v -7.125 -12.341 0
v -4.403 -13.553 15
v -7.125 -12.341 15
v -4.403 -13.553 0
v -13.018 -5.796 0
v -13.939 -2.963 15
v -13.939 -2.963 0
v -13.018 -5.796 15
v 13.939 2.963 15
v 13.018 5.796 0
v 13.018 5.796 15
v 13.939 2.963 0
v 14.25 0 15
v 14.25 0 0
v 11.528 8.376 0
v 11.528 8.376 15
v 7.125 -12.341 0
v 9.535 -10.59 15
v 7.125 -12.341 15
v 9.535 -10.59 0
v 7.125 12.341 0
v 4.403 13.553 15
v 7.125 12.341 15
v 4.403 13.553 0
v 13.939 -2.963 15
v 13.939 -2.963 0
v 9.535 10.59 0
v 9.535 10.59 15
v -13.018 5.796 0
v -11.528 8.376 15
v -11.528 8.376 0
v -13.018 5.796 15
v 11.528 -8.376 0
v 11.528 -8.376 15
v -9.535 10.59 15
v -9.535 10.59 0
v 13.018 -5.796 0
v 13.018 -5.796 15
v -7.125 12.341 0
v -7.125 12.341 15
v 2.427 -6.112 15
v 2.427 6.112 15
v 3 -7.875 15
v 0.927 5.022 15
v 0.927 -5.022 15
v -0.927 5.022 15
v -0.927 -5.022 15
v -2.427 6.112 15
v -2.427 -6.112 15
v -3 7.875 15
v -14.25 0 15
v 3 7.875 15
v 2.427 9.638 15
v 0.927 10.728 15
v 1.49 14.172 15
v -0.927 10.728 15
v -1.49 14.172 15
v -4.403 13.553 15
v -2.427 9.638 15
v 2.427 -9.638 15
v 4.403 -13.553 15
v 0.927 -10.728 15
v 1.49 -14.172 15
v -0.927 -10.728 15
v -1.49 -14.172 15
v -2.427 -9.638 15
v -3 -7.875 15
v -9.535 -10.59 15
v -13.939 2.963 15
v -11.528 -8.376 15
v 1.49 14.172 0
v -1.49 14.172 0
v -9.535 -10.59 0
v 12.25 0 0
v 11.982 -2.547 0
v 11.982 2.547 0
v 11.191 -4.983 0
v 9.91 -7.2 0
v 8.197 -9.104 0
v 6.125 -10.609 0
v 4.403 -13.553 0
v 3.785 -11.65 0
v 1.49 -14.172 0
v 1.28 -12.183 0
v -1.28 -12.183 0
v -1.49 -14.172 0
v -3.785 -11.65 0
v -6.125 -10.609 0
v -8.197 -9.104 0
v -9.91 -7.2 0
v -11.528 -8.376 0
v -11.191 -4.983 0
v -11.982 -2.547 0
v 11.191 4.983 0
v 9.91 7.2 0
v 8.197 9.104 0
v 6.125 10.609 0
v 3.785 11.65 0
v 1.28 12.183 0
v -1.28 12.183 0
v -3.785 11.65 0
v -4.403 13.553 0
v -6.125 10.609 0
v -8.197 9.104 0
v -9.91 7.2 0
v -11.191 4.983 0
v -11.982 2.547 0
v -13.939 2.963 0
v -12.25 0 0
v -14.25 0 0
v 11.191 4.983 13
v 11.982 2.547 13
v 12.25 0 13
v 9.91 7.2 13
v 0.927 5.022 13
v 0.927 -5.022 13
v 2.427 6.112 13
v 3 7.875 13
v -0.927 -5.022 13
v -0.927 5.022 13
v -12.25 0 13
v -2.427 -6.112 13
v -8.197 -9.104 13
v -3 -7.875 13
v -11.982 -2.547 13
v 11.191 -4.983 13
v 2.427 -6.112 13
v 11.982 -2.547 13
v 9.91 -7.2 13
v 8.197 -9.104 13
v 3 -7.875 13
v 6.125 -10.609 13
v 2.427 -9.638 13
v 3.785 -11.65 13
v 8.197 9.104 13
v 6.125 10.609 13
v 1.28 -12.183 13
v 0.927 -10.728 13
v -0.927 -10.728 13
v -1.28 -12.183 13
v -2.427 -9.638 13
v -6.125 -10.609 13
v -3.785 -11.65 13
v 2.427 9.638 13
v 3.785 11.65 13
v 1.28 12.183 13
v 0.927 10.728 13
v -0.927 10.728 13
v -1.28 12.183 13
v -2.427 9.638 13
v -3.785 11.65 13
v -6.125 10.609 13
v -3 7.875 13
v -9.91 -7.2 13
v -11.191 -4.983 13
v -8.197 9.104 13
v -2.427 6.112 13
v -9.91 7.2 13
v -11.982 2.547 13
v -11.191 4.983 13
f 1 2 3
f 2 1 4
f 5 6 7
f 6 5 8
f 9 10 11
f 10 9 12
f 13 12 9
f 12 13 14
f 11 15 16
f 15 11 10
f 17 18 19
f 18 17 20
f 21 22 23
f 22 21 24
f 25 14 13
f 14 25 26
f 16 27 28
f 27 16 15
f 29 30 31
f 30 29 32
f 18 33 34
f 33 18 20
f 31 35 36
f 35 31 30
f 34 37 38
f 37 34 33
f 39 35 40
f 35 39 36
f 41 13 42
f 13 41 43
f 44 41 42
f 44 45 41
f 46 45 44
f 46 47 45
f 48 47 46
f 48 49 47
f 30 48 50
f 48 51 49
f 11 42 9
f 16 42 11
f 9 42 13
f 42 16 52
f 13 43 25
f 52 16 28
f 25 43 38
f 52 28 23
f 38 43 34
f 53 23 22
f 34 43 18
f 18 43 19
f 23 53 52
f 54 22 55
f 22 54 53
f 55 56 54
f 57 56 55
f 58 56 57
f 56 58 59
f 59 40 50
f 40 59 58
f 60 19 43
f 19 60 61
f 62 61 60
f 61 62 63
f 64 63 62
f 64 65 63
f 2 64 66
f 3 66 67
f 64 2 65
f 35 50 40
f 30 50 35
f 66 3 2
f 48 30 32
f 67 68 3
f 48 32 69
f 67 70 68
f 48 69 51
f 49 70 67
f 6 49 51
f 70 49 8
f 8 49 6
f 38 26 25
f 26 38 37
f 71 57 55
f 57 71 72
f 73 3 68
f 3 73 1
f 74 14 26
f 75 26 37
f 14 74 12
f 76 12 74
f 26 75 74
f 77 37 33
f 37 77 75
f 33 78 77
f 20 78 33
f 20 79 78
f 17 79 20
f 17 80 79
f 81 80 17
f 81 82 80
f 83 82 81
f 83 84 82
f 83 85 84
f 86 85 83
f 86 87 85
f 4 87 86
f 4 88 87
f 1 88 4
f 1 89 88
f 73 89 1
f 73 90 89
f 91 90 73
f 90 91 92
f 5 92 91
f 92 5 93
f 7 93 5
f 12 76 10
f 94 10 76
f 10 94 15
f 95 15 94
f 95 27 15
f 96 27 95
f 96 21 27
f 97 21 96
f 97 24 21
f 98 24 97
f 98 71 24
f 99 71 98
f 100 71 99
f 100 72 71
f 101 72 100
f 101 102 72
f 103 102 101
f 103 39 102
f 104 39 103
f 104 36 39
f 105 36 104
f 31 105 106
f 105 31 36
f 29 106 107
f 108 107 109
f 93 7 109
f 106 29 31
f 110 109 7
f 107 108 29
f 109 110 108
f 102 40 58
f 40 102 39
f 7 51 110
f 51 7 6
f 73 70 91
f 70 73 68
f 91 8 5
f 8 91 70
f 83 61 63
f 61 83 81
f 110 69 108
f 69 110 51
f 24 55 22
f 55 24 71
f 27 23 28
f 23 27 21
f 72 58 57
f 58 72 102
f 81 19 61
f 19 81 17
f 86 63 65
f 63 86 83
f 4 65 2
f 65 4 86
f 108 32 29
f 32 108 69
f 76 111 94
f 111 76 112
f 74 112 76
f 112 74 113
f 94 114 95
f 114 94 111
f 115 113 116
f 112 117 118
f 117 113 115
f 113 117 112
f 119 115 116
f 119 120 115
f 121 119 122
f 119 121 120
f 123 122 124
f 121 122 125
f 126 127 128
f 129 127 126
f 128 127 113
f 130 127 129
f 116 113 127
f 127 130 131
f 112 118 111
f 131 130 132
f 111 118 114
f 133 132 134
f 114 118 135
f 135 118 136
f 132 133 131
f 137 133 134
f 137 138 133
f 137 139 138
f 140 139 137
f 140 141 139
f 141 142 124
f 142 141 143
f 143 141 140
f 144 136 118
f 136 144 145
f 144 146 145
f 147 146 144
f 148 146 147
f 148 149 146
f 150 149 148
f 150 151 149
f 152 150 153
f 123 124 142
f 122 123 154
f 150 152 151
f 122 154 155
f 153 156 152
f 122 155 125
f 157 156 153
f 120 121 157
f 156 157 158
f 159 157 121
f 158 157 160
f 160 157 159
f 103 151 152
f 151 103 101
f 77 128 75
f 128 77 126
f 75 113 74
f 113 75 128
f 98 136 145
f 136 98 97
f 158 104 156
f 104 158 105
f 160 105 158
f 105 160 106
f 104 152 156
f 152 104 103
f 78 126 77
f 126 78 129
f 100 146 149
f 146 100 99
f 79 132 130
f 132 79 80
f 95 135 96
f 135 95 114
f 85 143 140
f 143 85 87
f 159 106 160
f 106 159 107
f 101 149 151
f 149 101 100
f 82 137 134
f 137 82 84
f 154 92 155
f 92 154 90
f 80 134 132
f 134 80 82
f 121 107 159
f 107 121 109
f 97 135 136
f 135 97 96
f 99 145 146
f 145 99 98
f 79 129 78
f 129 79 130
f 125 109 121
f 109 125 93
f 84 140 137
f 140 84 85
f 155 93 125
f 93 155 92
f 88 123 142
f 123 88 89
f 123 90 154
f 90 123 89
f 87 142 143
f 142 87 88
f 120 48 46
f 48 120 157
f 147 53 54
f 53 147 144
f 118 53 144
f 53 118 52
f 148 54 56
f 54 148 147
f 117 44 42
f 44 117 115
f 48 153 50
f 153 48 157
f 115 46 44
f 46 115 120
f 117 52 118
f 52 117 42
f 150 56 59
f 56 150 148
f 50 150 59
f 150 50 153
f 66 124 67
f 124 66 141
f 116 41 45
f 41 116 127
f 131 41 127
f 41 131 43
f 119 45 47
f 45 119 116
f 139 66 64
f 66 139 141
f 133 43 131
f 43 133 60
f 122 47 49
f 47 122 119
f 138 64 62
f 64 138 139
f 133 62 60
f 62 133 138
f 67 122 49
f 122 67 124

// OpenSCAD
// This is a parametric case maker for a motor

//Example1

// to make a custom case, replace the parameters with your own

//examplemotor1
dm = 24.5; // Diameter of motor
th = 2; // Thickness of case
hc = 13; // Height of motor
he =  dm/2; // Height to ends
de = 2; // Diameter of ends
dbe = 15.75; // Distance between ends
le = 2.5; // Length of ends
dte = le/2; // Distance to ends

//Example2

//to use, get rid of "/*" and "*/"

/*//examplemotor2
dm = 18; // Diameter of motor
th = 2; // Thickness of case
hc = 28; // Height of motor
he =  19; // Height to ends
de = 4; // Diameter of ends
dbe = 12.5; // Distance between ends
le = 5; // Length of ends
dte = 7; // Distance to ends*/



//program
if (le-dte >0)
{
difference() {
cylinder(r = (dm/2+th), h = (hc+th));
cylinder(r = (dm/2), h = hc);
translate([dm/2-he,dbe/2,hc-dte/2])
cylinder(r = (de/2)+th, h = le+2 * th, center = true);
translate([dm/2-he,-dbe/2,hc-dte/2])
cylinder(r = (de/2)+th, h = le+2 * th, center = true);
}
}
else
{
difference() {
cylinder(r = (dm/2+th), h = (hc+th));
cylinder(r = (dm/2), h = hc);
translate([dm/2-he,dbe/2,hc-dte/2])
cylinder(r = (de/2)+th, h = le, center = true);
translate([dm/2-he,-dbe/2,hc-dte/2])
cylinder(r = (de/2)+th, h = le, center = true);
}
}
